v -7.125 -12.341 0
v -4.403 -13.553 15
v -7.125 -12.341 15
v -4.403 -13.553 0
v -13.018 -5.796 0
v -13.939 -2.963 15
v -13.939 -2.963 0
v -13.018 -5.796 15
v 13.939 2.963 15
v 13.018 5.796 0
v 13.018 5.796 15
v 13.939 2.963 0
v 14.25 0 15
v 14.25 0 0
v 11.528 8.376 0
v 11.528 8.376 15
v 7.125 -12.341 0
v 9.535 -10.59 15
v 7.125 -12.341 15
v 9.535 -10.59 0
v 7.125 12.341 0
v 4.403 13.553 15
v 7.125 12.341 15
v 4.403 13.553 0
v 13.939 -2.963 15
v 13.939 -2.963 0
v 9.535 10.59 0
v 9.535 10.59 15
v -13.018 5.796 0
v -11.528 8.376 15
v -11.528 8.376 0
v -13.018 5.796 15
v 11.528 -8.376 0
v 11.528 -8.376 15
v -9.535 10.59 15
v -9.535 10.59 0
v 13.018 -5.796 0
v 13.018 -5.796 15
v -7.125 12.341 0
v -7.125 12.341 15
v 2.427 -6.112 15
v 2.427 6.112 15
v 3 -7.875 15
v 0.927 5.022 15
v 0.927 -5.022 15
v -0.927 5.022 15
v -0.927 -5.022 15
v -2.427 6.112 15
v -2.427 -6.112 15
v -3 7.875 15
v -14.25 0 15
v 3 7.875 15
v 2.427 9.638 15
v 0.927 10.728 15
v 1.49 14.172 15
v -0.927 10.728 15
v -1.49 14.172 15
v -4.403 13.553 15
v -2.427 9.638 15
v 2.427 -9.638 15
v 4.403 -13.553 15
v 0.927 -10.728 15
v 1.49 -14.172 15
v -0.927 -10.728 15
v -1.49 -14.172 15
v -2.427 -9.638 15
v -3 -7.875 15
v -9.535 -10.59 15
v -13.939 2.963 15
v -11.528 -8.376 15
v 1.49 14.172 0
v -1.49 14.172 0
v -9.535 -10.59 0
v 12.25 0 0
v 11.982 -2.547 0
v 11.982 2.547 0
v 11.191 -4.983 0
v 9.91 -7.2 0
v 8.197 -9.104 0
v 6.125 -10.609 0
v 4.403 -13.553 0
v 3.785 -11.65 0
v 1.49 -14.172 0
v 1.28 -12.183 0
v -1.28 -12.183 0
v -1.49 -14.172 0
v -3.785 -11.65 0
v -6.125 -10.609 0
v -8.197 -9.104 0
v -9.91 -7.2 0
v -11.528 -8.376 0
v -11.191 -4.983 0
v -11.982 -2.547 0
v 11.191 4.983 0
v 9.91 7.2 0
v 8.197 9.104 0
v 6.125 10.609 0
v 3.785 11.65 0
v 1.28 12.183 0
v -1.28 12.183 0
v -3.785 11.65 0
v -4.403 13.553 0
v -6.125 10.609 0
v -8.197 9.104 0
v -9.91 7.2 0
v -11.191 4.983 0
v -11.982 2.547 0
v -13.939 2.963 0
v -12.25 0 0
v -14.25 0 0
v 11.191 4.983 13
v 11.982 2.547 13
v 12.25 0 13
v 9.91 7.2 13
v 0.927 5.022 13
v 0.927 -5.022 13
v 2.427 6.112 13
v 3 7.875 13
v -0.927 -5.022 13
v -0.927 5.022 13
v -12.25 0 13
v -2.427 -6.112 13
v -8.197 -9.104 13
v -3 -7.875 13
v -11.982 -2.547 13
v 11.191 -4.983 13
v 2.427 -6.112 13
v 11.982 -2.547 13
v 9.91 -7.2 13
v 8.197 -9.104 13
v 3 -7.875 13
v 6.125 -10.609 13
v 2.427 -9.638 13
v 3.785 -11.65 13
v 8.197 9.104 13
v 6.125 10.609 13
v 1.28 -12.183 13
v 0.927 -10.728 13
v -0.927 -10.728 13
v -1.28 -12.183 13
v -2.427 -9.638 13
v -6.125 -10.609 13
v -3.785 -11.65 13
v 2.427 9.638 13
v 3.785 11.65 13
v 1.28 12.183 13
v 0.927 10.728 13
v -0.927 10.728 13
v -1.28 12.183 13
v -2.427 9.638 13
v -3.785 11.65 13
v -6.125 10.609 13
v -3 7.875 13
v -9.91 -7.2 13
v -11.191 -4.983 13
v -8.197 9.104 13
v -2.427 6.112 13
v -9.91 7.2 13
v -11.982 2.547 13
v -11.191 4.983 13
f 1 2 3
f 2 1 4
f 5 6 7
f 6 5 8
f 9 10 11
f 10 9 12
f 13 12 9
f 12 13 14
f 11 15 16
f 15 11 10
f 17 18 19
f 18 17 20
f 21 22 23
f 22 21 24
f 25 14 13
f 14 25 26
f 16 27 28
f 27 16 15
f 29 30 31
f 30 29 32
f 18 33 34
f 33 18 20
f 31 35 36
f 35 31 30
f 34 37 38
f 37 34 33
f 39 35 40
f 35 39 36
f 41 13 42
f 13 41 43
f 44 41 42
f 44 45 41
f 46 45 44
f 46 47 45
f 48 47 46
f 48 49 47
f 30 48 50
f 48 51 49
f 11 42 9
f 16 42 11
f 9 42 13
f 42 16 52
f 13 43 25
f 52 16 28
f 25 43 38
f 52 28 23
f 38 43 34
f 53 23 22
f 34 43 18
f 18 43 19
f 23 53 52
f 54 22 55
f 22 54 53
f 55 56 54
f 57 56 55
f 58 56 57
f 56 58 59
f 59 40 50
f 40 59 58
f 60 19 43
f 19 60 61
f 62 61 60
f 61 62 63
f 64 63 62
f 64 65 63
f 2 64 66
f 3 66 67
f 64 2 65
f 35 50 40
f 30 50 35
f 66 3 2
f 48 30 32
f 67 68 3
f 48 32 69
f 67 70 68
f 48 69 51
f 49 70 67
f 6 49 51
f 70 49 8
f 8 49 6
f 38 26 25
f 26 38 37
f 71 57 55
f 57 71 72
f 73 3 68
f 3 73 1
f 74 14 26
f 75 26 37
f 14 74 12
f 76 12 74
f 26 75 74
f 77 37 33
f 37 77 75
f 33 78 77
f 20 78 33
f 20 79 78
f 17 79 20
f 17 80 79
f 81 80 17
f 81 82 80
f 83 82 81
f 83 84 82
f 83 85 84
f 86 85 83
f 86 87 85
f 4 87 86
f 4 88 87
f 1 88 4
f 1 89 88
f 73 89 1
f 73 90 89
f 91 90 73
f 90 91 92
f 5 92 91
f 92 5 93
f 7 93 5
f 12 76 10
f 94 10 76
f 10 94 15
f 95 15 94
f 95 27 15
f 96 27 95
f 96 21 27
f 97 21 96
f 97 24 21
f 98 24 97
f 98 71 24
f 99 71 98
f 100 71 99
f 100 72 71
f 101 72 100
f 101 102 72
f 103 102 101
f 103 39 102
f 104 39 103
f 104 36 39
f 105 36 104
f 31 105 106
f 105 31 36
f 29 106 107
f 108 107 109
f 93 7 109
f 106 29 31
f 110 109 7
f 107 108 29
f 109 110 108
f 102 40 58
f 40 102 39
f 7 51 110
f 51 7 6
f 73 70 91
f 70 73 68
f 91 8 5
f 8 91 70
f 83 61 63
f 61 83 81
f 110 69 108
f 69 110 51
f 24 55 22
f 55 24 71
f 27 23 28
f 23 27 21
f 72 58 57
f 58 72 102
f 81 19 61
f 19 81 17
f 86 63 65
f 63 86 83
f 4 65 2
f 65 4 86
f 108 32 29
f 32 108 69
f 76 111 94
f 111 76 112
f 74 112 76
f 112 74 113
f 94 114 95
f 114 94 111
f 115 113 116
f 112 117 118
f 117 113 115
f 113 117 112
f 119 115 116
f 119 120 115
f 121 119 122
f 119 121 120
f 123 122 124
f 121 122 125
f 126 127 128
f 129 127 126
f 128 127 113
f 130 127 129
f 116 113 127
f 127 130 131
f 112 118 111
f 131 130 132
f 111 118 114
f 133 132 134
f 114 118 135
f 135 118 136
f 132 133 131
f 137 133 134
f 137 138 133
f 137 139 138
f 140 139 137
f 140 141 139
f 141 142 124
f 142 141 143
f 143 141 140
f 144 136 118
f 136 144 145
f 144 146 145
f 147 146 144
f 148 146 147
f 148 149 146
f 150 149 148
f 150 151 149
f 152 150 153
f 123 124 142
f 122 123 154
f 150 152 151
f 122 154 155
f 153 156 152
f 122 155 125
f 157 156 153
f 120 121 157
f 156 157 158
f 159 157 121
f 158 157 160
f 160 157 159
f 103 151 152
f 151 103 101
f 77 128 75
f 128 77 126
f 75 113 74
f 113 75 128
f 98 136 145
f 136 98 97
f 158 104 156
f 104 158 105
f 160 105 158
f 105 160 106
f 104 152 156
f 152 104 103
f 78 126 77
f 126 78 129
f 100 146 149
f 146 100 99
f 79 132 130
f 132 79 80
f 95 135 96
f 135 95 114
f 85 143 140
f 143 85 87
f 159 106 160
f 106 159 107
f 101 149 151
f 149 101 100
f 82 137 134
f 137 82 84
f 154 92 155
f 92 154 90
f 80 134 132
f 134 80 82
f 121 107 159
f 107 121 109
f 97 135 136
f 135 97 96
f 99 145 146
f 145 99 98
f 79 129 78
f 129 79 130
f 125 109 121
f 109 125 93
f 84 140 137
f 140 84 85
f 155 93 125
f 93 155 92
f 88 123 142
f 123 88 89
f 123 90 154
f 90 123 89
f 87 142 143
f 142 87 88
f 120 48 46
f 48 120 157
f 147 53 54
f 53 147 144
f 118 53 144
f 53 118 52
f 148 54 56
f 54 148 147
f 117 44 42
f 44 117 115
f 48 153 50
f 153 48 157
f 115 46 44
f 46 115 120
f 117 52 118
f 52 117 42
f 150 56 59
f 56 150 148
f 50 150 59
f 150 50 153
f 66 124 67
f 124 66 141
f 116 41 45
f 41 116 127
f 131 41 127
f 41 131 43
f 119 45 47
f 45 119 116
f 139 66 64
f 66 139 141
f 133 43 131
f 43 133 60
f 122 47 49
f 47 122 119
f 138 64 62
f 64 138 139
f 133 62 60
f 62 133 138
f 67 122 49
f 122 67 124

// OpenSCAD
// This is a parametric case maker for a motor

//Example1

// to make a custom case, replace the parameters with your own

//examplemotor1
dm = 24.5; // Diameter of motor
th = 2; // Thickness of case
hc = 13; // Height of motor
he =  dm/2; // Height to ends
de = 2; // Diameter of ends
dbe = 15.75; // Distance between ends
le = 2.5; // Length of ends
dte = le/2; // Distance to ends

//Example2

//to use, get rid of "/*" and "*/"

/*//examplemotor2
dm = 18; // Diameter of motor
th = 2; // Thickness of case
hc = 28; // Height of motor
he =  19; // Height to ends
de = 4; // Diameter of ends
dbe = 12.5; // Distance between ends
le = 5; // Length of ends
dte = 7; // Distance to ends*/



//program
if (le-dte >0)
{
difference() {
cylinder(r = (dm/2+th), h = (hc+th));
cylinder(r = (dm/2), h = hc);
translate([dm/2-he,dbe/2,hc-dte/2])
cylinder(r = (de/2)+th, h = le+2 * th, center = true);
translate([dm/2-he,-dbe/2,hc-dte/2])
cylinder(r = (de/2)+th, h = le+2 * th, center = true);
}
}
else
{
difference() {
cylinder(r = (dm/2+th), h = (hc+th));
cylinder(r = (dm/2), h = hc);
translate([dm/2-he,dbe/2,hc-dte/2])
cylinder(r = (de/2)+th, h = le, center = true);
translate([dm/2-he,-dbe/2,hc-dte/2])
cylinder(r = (de/2)+th, h = le, center = true);
}
}
